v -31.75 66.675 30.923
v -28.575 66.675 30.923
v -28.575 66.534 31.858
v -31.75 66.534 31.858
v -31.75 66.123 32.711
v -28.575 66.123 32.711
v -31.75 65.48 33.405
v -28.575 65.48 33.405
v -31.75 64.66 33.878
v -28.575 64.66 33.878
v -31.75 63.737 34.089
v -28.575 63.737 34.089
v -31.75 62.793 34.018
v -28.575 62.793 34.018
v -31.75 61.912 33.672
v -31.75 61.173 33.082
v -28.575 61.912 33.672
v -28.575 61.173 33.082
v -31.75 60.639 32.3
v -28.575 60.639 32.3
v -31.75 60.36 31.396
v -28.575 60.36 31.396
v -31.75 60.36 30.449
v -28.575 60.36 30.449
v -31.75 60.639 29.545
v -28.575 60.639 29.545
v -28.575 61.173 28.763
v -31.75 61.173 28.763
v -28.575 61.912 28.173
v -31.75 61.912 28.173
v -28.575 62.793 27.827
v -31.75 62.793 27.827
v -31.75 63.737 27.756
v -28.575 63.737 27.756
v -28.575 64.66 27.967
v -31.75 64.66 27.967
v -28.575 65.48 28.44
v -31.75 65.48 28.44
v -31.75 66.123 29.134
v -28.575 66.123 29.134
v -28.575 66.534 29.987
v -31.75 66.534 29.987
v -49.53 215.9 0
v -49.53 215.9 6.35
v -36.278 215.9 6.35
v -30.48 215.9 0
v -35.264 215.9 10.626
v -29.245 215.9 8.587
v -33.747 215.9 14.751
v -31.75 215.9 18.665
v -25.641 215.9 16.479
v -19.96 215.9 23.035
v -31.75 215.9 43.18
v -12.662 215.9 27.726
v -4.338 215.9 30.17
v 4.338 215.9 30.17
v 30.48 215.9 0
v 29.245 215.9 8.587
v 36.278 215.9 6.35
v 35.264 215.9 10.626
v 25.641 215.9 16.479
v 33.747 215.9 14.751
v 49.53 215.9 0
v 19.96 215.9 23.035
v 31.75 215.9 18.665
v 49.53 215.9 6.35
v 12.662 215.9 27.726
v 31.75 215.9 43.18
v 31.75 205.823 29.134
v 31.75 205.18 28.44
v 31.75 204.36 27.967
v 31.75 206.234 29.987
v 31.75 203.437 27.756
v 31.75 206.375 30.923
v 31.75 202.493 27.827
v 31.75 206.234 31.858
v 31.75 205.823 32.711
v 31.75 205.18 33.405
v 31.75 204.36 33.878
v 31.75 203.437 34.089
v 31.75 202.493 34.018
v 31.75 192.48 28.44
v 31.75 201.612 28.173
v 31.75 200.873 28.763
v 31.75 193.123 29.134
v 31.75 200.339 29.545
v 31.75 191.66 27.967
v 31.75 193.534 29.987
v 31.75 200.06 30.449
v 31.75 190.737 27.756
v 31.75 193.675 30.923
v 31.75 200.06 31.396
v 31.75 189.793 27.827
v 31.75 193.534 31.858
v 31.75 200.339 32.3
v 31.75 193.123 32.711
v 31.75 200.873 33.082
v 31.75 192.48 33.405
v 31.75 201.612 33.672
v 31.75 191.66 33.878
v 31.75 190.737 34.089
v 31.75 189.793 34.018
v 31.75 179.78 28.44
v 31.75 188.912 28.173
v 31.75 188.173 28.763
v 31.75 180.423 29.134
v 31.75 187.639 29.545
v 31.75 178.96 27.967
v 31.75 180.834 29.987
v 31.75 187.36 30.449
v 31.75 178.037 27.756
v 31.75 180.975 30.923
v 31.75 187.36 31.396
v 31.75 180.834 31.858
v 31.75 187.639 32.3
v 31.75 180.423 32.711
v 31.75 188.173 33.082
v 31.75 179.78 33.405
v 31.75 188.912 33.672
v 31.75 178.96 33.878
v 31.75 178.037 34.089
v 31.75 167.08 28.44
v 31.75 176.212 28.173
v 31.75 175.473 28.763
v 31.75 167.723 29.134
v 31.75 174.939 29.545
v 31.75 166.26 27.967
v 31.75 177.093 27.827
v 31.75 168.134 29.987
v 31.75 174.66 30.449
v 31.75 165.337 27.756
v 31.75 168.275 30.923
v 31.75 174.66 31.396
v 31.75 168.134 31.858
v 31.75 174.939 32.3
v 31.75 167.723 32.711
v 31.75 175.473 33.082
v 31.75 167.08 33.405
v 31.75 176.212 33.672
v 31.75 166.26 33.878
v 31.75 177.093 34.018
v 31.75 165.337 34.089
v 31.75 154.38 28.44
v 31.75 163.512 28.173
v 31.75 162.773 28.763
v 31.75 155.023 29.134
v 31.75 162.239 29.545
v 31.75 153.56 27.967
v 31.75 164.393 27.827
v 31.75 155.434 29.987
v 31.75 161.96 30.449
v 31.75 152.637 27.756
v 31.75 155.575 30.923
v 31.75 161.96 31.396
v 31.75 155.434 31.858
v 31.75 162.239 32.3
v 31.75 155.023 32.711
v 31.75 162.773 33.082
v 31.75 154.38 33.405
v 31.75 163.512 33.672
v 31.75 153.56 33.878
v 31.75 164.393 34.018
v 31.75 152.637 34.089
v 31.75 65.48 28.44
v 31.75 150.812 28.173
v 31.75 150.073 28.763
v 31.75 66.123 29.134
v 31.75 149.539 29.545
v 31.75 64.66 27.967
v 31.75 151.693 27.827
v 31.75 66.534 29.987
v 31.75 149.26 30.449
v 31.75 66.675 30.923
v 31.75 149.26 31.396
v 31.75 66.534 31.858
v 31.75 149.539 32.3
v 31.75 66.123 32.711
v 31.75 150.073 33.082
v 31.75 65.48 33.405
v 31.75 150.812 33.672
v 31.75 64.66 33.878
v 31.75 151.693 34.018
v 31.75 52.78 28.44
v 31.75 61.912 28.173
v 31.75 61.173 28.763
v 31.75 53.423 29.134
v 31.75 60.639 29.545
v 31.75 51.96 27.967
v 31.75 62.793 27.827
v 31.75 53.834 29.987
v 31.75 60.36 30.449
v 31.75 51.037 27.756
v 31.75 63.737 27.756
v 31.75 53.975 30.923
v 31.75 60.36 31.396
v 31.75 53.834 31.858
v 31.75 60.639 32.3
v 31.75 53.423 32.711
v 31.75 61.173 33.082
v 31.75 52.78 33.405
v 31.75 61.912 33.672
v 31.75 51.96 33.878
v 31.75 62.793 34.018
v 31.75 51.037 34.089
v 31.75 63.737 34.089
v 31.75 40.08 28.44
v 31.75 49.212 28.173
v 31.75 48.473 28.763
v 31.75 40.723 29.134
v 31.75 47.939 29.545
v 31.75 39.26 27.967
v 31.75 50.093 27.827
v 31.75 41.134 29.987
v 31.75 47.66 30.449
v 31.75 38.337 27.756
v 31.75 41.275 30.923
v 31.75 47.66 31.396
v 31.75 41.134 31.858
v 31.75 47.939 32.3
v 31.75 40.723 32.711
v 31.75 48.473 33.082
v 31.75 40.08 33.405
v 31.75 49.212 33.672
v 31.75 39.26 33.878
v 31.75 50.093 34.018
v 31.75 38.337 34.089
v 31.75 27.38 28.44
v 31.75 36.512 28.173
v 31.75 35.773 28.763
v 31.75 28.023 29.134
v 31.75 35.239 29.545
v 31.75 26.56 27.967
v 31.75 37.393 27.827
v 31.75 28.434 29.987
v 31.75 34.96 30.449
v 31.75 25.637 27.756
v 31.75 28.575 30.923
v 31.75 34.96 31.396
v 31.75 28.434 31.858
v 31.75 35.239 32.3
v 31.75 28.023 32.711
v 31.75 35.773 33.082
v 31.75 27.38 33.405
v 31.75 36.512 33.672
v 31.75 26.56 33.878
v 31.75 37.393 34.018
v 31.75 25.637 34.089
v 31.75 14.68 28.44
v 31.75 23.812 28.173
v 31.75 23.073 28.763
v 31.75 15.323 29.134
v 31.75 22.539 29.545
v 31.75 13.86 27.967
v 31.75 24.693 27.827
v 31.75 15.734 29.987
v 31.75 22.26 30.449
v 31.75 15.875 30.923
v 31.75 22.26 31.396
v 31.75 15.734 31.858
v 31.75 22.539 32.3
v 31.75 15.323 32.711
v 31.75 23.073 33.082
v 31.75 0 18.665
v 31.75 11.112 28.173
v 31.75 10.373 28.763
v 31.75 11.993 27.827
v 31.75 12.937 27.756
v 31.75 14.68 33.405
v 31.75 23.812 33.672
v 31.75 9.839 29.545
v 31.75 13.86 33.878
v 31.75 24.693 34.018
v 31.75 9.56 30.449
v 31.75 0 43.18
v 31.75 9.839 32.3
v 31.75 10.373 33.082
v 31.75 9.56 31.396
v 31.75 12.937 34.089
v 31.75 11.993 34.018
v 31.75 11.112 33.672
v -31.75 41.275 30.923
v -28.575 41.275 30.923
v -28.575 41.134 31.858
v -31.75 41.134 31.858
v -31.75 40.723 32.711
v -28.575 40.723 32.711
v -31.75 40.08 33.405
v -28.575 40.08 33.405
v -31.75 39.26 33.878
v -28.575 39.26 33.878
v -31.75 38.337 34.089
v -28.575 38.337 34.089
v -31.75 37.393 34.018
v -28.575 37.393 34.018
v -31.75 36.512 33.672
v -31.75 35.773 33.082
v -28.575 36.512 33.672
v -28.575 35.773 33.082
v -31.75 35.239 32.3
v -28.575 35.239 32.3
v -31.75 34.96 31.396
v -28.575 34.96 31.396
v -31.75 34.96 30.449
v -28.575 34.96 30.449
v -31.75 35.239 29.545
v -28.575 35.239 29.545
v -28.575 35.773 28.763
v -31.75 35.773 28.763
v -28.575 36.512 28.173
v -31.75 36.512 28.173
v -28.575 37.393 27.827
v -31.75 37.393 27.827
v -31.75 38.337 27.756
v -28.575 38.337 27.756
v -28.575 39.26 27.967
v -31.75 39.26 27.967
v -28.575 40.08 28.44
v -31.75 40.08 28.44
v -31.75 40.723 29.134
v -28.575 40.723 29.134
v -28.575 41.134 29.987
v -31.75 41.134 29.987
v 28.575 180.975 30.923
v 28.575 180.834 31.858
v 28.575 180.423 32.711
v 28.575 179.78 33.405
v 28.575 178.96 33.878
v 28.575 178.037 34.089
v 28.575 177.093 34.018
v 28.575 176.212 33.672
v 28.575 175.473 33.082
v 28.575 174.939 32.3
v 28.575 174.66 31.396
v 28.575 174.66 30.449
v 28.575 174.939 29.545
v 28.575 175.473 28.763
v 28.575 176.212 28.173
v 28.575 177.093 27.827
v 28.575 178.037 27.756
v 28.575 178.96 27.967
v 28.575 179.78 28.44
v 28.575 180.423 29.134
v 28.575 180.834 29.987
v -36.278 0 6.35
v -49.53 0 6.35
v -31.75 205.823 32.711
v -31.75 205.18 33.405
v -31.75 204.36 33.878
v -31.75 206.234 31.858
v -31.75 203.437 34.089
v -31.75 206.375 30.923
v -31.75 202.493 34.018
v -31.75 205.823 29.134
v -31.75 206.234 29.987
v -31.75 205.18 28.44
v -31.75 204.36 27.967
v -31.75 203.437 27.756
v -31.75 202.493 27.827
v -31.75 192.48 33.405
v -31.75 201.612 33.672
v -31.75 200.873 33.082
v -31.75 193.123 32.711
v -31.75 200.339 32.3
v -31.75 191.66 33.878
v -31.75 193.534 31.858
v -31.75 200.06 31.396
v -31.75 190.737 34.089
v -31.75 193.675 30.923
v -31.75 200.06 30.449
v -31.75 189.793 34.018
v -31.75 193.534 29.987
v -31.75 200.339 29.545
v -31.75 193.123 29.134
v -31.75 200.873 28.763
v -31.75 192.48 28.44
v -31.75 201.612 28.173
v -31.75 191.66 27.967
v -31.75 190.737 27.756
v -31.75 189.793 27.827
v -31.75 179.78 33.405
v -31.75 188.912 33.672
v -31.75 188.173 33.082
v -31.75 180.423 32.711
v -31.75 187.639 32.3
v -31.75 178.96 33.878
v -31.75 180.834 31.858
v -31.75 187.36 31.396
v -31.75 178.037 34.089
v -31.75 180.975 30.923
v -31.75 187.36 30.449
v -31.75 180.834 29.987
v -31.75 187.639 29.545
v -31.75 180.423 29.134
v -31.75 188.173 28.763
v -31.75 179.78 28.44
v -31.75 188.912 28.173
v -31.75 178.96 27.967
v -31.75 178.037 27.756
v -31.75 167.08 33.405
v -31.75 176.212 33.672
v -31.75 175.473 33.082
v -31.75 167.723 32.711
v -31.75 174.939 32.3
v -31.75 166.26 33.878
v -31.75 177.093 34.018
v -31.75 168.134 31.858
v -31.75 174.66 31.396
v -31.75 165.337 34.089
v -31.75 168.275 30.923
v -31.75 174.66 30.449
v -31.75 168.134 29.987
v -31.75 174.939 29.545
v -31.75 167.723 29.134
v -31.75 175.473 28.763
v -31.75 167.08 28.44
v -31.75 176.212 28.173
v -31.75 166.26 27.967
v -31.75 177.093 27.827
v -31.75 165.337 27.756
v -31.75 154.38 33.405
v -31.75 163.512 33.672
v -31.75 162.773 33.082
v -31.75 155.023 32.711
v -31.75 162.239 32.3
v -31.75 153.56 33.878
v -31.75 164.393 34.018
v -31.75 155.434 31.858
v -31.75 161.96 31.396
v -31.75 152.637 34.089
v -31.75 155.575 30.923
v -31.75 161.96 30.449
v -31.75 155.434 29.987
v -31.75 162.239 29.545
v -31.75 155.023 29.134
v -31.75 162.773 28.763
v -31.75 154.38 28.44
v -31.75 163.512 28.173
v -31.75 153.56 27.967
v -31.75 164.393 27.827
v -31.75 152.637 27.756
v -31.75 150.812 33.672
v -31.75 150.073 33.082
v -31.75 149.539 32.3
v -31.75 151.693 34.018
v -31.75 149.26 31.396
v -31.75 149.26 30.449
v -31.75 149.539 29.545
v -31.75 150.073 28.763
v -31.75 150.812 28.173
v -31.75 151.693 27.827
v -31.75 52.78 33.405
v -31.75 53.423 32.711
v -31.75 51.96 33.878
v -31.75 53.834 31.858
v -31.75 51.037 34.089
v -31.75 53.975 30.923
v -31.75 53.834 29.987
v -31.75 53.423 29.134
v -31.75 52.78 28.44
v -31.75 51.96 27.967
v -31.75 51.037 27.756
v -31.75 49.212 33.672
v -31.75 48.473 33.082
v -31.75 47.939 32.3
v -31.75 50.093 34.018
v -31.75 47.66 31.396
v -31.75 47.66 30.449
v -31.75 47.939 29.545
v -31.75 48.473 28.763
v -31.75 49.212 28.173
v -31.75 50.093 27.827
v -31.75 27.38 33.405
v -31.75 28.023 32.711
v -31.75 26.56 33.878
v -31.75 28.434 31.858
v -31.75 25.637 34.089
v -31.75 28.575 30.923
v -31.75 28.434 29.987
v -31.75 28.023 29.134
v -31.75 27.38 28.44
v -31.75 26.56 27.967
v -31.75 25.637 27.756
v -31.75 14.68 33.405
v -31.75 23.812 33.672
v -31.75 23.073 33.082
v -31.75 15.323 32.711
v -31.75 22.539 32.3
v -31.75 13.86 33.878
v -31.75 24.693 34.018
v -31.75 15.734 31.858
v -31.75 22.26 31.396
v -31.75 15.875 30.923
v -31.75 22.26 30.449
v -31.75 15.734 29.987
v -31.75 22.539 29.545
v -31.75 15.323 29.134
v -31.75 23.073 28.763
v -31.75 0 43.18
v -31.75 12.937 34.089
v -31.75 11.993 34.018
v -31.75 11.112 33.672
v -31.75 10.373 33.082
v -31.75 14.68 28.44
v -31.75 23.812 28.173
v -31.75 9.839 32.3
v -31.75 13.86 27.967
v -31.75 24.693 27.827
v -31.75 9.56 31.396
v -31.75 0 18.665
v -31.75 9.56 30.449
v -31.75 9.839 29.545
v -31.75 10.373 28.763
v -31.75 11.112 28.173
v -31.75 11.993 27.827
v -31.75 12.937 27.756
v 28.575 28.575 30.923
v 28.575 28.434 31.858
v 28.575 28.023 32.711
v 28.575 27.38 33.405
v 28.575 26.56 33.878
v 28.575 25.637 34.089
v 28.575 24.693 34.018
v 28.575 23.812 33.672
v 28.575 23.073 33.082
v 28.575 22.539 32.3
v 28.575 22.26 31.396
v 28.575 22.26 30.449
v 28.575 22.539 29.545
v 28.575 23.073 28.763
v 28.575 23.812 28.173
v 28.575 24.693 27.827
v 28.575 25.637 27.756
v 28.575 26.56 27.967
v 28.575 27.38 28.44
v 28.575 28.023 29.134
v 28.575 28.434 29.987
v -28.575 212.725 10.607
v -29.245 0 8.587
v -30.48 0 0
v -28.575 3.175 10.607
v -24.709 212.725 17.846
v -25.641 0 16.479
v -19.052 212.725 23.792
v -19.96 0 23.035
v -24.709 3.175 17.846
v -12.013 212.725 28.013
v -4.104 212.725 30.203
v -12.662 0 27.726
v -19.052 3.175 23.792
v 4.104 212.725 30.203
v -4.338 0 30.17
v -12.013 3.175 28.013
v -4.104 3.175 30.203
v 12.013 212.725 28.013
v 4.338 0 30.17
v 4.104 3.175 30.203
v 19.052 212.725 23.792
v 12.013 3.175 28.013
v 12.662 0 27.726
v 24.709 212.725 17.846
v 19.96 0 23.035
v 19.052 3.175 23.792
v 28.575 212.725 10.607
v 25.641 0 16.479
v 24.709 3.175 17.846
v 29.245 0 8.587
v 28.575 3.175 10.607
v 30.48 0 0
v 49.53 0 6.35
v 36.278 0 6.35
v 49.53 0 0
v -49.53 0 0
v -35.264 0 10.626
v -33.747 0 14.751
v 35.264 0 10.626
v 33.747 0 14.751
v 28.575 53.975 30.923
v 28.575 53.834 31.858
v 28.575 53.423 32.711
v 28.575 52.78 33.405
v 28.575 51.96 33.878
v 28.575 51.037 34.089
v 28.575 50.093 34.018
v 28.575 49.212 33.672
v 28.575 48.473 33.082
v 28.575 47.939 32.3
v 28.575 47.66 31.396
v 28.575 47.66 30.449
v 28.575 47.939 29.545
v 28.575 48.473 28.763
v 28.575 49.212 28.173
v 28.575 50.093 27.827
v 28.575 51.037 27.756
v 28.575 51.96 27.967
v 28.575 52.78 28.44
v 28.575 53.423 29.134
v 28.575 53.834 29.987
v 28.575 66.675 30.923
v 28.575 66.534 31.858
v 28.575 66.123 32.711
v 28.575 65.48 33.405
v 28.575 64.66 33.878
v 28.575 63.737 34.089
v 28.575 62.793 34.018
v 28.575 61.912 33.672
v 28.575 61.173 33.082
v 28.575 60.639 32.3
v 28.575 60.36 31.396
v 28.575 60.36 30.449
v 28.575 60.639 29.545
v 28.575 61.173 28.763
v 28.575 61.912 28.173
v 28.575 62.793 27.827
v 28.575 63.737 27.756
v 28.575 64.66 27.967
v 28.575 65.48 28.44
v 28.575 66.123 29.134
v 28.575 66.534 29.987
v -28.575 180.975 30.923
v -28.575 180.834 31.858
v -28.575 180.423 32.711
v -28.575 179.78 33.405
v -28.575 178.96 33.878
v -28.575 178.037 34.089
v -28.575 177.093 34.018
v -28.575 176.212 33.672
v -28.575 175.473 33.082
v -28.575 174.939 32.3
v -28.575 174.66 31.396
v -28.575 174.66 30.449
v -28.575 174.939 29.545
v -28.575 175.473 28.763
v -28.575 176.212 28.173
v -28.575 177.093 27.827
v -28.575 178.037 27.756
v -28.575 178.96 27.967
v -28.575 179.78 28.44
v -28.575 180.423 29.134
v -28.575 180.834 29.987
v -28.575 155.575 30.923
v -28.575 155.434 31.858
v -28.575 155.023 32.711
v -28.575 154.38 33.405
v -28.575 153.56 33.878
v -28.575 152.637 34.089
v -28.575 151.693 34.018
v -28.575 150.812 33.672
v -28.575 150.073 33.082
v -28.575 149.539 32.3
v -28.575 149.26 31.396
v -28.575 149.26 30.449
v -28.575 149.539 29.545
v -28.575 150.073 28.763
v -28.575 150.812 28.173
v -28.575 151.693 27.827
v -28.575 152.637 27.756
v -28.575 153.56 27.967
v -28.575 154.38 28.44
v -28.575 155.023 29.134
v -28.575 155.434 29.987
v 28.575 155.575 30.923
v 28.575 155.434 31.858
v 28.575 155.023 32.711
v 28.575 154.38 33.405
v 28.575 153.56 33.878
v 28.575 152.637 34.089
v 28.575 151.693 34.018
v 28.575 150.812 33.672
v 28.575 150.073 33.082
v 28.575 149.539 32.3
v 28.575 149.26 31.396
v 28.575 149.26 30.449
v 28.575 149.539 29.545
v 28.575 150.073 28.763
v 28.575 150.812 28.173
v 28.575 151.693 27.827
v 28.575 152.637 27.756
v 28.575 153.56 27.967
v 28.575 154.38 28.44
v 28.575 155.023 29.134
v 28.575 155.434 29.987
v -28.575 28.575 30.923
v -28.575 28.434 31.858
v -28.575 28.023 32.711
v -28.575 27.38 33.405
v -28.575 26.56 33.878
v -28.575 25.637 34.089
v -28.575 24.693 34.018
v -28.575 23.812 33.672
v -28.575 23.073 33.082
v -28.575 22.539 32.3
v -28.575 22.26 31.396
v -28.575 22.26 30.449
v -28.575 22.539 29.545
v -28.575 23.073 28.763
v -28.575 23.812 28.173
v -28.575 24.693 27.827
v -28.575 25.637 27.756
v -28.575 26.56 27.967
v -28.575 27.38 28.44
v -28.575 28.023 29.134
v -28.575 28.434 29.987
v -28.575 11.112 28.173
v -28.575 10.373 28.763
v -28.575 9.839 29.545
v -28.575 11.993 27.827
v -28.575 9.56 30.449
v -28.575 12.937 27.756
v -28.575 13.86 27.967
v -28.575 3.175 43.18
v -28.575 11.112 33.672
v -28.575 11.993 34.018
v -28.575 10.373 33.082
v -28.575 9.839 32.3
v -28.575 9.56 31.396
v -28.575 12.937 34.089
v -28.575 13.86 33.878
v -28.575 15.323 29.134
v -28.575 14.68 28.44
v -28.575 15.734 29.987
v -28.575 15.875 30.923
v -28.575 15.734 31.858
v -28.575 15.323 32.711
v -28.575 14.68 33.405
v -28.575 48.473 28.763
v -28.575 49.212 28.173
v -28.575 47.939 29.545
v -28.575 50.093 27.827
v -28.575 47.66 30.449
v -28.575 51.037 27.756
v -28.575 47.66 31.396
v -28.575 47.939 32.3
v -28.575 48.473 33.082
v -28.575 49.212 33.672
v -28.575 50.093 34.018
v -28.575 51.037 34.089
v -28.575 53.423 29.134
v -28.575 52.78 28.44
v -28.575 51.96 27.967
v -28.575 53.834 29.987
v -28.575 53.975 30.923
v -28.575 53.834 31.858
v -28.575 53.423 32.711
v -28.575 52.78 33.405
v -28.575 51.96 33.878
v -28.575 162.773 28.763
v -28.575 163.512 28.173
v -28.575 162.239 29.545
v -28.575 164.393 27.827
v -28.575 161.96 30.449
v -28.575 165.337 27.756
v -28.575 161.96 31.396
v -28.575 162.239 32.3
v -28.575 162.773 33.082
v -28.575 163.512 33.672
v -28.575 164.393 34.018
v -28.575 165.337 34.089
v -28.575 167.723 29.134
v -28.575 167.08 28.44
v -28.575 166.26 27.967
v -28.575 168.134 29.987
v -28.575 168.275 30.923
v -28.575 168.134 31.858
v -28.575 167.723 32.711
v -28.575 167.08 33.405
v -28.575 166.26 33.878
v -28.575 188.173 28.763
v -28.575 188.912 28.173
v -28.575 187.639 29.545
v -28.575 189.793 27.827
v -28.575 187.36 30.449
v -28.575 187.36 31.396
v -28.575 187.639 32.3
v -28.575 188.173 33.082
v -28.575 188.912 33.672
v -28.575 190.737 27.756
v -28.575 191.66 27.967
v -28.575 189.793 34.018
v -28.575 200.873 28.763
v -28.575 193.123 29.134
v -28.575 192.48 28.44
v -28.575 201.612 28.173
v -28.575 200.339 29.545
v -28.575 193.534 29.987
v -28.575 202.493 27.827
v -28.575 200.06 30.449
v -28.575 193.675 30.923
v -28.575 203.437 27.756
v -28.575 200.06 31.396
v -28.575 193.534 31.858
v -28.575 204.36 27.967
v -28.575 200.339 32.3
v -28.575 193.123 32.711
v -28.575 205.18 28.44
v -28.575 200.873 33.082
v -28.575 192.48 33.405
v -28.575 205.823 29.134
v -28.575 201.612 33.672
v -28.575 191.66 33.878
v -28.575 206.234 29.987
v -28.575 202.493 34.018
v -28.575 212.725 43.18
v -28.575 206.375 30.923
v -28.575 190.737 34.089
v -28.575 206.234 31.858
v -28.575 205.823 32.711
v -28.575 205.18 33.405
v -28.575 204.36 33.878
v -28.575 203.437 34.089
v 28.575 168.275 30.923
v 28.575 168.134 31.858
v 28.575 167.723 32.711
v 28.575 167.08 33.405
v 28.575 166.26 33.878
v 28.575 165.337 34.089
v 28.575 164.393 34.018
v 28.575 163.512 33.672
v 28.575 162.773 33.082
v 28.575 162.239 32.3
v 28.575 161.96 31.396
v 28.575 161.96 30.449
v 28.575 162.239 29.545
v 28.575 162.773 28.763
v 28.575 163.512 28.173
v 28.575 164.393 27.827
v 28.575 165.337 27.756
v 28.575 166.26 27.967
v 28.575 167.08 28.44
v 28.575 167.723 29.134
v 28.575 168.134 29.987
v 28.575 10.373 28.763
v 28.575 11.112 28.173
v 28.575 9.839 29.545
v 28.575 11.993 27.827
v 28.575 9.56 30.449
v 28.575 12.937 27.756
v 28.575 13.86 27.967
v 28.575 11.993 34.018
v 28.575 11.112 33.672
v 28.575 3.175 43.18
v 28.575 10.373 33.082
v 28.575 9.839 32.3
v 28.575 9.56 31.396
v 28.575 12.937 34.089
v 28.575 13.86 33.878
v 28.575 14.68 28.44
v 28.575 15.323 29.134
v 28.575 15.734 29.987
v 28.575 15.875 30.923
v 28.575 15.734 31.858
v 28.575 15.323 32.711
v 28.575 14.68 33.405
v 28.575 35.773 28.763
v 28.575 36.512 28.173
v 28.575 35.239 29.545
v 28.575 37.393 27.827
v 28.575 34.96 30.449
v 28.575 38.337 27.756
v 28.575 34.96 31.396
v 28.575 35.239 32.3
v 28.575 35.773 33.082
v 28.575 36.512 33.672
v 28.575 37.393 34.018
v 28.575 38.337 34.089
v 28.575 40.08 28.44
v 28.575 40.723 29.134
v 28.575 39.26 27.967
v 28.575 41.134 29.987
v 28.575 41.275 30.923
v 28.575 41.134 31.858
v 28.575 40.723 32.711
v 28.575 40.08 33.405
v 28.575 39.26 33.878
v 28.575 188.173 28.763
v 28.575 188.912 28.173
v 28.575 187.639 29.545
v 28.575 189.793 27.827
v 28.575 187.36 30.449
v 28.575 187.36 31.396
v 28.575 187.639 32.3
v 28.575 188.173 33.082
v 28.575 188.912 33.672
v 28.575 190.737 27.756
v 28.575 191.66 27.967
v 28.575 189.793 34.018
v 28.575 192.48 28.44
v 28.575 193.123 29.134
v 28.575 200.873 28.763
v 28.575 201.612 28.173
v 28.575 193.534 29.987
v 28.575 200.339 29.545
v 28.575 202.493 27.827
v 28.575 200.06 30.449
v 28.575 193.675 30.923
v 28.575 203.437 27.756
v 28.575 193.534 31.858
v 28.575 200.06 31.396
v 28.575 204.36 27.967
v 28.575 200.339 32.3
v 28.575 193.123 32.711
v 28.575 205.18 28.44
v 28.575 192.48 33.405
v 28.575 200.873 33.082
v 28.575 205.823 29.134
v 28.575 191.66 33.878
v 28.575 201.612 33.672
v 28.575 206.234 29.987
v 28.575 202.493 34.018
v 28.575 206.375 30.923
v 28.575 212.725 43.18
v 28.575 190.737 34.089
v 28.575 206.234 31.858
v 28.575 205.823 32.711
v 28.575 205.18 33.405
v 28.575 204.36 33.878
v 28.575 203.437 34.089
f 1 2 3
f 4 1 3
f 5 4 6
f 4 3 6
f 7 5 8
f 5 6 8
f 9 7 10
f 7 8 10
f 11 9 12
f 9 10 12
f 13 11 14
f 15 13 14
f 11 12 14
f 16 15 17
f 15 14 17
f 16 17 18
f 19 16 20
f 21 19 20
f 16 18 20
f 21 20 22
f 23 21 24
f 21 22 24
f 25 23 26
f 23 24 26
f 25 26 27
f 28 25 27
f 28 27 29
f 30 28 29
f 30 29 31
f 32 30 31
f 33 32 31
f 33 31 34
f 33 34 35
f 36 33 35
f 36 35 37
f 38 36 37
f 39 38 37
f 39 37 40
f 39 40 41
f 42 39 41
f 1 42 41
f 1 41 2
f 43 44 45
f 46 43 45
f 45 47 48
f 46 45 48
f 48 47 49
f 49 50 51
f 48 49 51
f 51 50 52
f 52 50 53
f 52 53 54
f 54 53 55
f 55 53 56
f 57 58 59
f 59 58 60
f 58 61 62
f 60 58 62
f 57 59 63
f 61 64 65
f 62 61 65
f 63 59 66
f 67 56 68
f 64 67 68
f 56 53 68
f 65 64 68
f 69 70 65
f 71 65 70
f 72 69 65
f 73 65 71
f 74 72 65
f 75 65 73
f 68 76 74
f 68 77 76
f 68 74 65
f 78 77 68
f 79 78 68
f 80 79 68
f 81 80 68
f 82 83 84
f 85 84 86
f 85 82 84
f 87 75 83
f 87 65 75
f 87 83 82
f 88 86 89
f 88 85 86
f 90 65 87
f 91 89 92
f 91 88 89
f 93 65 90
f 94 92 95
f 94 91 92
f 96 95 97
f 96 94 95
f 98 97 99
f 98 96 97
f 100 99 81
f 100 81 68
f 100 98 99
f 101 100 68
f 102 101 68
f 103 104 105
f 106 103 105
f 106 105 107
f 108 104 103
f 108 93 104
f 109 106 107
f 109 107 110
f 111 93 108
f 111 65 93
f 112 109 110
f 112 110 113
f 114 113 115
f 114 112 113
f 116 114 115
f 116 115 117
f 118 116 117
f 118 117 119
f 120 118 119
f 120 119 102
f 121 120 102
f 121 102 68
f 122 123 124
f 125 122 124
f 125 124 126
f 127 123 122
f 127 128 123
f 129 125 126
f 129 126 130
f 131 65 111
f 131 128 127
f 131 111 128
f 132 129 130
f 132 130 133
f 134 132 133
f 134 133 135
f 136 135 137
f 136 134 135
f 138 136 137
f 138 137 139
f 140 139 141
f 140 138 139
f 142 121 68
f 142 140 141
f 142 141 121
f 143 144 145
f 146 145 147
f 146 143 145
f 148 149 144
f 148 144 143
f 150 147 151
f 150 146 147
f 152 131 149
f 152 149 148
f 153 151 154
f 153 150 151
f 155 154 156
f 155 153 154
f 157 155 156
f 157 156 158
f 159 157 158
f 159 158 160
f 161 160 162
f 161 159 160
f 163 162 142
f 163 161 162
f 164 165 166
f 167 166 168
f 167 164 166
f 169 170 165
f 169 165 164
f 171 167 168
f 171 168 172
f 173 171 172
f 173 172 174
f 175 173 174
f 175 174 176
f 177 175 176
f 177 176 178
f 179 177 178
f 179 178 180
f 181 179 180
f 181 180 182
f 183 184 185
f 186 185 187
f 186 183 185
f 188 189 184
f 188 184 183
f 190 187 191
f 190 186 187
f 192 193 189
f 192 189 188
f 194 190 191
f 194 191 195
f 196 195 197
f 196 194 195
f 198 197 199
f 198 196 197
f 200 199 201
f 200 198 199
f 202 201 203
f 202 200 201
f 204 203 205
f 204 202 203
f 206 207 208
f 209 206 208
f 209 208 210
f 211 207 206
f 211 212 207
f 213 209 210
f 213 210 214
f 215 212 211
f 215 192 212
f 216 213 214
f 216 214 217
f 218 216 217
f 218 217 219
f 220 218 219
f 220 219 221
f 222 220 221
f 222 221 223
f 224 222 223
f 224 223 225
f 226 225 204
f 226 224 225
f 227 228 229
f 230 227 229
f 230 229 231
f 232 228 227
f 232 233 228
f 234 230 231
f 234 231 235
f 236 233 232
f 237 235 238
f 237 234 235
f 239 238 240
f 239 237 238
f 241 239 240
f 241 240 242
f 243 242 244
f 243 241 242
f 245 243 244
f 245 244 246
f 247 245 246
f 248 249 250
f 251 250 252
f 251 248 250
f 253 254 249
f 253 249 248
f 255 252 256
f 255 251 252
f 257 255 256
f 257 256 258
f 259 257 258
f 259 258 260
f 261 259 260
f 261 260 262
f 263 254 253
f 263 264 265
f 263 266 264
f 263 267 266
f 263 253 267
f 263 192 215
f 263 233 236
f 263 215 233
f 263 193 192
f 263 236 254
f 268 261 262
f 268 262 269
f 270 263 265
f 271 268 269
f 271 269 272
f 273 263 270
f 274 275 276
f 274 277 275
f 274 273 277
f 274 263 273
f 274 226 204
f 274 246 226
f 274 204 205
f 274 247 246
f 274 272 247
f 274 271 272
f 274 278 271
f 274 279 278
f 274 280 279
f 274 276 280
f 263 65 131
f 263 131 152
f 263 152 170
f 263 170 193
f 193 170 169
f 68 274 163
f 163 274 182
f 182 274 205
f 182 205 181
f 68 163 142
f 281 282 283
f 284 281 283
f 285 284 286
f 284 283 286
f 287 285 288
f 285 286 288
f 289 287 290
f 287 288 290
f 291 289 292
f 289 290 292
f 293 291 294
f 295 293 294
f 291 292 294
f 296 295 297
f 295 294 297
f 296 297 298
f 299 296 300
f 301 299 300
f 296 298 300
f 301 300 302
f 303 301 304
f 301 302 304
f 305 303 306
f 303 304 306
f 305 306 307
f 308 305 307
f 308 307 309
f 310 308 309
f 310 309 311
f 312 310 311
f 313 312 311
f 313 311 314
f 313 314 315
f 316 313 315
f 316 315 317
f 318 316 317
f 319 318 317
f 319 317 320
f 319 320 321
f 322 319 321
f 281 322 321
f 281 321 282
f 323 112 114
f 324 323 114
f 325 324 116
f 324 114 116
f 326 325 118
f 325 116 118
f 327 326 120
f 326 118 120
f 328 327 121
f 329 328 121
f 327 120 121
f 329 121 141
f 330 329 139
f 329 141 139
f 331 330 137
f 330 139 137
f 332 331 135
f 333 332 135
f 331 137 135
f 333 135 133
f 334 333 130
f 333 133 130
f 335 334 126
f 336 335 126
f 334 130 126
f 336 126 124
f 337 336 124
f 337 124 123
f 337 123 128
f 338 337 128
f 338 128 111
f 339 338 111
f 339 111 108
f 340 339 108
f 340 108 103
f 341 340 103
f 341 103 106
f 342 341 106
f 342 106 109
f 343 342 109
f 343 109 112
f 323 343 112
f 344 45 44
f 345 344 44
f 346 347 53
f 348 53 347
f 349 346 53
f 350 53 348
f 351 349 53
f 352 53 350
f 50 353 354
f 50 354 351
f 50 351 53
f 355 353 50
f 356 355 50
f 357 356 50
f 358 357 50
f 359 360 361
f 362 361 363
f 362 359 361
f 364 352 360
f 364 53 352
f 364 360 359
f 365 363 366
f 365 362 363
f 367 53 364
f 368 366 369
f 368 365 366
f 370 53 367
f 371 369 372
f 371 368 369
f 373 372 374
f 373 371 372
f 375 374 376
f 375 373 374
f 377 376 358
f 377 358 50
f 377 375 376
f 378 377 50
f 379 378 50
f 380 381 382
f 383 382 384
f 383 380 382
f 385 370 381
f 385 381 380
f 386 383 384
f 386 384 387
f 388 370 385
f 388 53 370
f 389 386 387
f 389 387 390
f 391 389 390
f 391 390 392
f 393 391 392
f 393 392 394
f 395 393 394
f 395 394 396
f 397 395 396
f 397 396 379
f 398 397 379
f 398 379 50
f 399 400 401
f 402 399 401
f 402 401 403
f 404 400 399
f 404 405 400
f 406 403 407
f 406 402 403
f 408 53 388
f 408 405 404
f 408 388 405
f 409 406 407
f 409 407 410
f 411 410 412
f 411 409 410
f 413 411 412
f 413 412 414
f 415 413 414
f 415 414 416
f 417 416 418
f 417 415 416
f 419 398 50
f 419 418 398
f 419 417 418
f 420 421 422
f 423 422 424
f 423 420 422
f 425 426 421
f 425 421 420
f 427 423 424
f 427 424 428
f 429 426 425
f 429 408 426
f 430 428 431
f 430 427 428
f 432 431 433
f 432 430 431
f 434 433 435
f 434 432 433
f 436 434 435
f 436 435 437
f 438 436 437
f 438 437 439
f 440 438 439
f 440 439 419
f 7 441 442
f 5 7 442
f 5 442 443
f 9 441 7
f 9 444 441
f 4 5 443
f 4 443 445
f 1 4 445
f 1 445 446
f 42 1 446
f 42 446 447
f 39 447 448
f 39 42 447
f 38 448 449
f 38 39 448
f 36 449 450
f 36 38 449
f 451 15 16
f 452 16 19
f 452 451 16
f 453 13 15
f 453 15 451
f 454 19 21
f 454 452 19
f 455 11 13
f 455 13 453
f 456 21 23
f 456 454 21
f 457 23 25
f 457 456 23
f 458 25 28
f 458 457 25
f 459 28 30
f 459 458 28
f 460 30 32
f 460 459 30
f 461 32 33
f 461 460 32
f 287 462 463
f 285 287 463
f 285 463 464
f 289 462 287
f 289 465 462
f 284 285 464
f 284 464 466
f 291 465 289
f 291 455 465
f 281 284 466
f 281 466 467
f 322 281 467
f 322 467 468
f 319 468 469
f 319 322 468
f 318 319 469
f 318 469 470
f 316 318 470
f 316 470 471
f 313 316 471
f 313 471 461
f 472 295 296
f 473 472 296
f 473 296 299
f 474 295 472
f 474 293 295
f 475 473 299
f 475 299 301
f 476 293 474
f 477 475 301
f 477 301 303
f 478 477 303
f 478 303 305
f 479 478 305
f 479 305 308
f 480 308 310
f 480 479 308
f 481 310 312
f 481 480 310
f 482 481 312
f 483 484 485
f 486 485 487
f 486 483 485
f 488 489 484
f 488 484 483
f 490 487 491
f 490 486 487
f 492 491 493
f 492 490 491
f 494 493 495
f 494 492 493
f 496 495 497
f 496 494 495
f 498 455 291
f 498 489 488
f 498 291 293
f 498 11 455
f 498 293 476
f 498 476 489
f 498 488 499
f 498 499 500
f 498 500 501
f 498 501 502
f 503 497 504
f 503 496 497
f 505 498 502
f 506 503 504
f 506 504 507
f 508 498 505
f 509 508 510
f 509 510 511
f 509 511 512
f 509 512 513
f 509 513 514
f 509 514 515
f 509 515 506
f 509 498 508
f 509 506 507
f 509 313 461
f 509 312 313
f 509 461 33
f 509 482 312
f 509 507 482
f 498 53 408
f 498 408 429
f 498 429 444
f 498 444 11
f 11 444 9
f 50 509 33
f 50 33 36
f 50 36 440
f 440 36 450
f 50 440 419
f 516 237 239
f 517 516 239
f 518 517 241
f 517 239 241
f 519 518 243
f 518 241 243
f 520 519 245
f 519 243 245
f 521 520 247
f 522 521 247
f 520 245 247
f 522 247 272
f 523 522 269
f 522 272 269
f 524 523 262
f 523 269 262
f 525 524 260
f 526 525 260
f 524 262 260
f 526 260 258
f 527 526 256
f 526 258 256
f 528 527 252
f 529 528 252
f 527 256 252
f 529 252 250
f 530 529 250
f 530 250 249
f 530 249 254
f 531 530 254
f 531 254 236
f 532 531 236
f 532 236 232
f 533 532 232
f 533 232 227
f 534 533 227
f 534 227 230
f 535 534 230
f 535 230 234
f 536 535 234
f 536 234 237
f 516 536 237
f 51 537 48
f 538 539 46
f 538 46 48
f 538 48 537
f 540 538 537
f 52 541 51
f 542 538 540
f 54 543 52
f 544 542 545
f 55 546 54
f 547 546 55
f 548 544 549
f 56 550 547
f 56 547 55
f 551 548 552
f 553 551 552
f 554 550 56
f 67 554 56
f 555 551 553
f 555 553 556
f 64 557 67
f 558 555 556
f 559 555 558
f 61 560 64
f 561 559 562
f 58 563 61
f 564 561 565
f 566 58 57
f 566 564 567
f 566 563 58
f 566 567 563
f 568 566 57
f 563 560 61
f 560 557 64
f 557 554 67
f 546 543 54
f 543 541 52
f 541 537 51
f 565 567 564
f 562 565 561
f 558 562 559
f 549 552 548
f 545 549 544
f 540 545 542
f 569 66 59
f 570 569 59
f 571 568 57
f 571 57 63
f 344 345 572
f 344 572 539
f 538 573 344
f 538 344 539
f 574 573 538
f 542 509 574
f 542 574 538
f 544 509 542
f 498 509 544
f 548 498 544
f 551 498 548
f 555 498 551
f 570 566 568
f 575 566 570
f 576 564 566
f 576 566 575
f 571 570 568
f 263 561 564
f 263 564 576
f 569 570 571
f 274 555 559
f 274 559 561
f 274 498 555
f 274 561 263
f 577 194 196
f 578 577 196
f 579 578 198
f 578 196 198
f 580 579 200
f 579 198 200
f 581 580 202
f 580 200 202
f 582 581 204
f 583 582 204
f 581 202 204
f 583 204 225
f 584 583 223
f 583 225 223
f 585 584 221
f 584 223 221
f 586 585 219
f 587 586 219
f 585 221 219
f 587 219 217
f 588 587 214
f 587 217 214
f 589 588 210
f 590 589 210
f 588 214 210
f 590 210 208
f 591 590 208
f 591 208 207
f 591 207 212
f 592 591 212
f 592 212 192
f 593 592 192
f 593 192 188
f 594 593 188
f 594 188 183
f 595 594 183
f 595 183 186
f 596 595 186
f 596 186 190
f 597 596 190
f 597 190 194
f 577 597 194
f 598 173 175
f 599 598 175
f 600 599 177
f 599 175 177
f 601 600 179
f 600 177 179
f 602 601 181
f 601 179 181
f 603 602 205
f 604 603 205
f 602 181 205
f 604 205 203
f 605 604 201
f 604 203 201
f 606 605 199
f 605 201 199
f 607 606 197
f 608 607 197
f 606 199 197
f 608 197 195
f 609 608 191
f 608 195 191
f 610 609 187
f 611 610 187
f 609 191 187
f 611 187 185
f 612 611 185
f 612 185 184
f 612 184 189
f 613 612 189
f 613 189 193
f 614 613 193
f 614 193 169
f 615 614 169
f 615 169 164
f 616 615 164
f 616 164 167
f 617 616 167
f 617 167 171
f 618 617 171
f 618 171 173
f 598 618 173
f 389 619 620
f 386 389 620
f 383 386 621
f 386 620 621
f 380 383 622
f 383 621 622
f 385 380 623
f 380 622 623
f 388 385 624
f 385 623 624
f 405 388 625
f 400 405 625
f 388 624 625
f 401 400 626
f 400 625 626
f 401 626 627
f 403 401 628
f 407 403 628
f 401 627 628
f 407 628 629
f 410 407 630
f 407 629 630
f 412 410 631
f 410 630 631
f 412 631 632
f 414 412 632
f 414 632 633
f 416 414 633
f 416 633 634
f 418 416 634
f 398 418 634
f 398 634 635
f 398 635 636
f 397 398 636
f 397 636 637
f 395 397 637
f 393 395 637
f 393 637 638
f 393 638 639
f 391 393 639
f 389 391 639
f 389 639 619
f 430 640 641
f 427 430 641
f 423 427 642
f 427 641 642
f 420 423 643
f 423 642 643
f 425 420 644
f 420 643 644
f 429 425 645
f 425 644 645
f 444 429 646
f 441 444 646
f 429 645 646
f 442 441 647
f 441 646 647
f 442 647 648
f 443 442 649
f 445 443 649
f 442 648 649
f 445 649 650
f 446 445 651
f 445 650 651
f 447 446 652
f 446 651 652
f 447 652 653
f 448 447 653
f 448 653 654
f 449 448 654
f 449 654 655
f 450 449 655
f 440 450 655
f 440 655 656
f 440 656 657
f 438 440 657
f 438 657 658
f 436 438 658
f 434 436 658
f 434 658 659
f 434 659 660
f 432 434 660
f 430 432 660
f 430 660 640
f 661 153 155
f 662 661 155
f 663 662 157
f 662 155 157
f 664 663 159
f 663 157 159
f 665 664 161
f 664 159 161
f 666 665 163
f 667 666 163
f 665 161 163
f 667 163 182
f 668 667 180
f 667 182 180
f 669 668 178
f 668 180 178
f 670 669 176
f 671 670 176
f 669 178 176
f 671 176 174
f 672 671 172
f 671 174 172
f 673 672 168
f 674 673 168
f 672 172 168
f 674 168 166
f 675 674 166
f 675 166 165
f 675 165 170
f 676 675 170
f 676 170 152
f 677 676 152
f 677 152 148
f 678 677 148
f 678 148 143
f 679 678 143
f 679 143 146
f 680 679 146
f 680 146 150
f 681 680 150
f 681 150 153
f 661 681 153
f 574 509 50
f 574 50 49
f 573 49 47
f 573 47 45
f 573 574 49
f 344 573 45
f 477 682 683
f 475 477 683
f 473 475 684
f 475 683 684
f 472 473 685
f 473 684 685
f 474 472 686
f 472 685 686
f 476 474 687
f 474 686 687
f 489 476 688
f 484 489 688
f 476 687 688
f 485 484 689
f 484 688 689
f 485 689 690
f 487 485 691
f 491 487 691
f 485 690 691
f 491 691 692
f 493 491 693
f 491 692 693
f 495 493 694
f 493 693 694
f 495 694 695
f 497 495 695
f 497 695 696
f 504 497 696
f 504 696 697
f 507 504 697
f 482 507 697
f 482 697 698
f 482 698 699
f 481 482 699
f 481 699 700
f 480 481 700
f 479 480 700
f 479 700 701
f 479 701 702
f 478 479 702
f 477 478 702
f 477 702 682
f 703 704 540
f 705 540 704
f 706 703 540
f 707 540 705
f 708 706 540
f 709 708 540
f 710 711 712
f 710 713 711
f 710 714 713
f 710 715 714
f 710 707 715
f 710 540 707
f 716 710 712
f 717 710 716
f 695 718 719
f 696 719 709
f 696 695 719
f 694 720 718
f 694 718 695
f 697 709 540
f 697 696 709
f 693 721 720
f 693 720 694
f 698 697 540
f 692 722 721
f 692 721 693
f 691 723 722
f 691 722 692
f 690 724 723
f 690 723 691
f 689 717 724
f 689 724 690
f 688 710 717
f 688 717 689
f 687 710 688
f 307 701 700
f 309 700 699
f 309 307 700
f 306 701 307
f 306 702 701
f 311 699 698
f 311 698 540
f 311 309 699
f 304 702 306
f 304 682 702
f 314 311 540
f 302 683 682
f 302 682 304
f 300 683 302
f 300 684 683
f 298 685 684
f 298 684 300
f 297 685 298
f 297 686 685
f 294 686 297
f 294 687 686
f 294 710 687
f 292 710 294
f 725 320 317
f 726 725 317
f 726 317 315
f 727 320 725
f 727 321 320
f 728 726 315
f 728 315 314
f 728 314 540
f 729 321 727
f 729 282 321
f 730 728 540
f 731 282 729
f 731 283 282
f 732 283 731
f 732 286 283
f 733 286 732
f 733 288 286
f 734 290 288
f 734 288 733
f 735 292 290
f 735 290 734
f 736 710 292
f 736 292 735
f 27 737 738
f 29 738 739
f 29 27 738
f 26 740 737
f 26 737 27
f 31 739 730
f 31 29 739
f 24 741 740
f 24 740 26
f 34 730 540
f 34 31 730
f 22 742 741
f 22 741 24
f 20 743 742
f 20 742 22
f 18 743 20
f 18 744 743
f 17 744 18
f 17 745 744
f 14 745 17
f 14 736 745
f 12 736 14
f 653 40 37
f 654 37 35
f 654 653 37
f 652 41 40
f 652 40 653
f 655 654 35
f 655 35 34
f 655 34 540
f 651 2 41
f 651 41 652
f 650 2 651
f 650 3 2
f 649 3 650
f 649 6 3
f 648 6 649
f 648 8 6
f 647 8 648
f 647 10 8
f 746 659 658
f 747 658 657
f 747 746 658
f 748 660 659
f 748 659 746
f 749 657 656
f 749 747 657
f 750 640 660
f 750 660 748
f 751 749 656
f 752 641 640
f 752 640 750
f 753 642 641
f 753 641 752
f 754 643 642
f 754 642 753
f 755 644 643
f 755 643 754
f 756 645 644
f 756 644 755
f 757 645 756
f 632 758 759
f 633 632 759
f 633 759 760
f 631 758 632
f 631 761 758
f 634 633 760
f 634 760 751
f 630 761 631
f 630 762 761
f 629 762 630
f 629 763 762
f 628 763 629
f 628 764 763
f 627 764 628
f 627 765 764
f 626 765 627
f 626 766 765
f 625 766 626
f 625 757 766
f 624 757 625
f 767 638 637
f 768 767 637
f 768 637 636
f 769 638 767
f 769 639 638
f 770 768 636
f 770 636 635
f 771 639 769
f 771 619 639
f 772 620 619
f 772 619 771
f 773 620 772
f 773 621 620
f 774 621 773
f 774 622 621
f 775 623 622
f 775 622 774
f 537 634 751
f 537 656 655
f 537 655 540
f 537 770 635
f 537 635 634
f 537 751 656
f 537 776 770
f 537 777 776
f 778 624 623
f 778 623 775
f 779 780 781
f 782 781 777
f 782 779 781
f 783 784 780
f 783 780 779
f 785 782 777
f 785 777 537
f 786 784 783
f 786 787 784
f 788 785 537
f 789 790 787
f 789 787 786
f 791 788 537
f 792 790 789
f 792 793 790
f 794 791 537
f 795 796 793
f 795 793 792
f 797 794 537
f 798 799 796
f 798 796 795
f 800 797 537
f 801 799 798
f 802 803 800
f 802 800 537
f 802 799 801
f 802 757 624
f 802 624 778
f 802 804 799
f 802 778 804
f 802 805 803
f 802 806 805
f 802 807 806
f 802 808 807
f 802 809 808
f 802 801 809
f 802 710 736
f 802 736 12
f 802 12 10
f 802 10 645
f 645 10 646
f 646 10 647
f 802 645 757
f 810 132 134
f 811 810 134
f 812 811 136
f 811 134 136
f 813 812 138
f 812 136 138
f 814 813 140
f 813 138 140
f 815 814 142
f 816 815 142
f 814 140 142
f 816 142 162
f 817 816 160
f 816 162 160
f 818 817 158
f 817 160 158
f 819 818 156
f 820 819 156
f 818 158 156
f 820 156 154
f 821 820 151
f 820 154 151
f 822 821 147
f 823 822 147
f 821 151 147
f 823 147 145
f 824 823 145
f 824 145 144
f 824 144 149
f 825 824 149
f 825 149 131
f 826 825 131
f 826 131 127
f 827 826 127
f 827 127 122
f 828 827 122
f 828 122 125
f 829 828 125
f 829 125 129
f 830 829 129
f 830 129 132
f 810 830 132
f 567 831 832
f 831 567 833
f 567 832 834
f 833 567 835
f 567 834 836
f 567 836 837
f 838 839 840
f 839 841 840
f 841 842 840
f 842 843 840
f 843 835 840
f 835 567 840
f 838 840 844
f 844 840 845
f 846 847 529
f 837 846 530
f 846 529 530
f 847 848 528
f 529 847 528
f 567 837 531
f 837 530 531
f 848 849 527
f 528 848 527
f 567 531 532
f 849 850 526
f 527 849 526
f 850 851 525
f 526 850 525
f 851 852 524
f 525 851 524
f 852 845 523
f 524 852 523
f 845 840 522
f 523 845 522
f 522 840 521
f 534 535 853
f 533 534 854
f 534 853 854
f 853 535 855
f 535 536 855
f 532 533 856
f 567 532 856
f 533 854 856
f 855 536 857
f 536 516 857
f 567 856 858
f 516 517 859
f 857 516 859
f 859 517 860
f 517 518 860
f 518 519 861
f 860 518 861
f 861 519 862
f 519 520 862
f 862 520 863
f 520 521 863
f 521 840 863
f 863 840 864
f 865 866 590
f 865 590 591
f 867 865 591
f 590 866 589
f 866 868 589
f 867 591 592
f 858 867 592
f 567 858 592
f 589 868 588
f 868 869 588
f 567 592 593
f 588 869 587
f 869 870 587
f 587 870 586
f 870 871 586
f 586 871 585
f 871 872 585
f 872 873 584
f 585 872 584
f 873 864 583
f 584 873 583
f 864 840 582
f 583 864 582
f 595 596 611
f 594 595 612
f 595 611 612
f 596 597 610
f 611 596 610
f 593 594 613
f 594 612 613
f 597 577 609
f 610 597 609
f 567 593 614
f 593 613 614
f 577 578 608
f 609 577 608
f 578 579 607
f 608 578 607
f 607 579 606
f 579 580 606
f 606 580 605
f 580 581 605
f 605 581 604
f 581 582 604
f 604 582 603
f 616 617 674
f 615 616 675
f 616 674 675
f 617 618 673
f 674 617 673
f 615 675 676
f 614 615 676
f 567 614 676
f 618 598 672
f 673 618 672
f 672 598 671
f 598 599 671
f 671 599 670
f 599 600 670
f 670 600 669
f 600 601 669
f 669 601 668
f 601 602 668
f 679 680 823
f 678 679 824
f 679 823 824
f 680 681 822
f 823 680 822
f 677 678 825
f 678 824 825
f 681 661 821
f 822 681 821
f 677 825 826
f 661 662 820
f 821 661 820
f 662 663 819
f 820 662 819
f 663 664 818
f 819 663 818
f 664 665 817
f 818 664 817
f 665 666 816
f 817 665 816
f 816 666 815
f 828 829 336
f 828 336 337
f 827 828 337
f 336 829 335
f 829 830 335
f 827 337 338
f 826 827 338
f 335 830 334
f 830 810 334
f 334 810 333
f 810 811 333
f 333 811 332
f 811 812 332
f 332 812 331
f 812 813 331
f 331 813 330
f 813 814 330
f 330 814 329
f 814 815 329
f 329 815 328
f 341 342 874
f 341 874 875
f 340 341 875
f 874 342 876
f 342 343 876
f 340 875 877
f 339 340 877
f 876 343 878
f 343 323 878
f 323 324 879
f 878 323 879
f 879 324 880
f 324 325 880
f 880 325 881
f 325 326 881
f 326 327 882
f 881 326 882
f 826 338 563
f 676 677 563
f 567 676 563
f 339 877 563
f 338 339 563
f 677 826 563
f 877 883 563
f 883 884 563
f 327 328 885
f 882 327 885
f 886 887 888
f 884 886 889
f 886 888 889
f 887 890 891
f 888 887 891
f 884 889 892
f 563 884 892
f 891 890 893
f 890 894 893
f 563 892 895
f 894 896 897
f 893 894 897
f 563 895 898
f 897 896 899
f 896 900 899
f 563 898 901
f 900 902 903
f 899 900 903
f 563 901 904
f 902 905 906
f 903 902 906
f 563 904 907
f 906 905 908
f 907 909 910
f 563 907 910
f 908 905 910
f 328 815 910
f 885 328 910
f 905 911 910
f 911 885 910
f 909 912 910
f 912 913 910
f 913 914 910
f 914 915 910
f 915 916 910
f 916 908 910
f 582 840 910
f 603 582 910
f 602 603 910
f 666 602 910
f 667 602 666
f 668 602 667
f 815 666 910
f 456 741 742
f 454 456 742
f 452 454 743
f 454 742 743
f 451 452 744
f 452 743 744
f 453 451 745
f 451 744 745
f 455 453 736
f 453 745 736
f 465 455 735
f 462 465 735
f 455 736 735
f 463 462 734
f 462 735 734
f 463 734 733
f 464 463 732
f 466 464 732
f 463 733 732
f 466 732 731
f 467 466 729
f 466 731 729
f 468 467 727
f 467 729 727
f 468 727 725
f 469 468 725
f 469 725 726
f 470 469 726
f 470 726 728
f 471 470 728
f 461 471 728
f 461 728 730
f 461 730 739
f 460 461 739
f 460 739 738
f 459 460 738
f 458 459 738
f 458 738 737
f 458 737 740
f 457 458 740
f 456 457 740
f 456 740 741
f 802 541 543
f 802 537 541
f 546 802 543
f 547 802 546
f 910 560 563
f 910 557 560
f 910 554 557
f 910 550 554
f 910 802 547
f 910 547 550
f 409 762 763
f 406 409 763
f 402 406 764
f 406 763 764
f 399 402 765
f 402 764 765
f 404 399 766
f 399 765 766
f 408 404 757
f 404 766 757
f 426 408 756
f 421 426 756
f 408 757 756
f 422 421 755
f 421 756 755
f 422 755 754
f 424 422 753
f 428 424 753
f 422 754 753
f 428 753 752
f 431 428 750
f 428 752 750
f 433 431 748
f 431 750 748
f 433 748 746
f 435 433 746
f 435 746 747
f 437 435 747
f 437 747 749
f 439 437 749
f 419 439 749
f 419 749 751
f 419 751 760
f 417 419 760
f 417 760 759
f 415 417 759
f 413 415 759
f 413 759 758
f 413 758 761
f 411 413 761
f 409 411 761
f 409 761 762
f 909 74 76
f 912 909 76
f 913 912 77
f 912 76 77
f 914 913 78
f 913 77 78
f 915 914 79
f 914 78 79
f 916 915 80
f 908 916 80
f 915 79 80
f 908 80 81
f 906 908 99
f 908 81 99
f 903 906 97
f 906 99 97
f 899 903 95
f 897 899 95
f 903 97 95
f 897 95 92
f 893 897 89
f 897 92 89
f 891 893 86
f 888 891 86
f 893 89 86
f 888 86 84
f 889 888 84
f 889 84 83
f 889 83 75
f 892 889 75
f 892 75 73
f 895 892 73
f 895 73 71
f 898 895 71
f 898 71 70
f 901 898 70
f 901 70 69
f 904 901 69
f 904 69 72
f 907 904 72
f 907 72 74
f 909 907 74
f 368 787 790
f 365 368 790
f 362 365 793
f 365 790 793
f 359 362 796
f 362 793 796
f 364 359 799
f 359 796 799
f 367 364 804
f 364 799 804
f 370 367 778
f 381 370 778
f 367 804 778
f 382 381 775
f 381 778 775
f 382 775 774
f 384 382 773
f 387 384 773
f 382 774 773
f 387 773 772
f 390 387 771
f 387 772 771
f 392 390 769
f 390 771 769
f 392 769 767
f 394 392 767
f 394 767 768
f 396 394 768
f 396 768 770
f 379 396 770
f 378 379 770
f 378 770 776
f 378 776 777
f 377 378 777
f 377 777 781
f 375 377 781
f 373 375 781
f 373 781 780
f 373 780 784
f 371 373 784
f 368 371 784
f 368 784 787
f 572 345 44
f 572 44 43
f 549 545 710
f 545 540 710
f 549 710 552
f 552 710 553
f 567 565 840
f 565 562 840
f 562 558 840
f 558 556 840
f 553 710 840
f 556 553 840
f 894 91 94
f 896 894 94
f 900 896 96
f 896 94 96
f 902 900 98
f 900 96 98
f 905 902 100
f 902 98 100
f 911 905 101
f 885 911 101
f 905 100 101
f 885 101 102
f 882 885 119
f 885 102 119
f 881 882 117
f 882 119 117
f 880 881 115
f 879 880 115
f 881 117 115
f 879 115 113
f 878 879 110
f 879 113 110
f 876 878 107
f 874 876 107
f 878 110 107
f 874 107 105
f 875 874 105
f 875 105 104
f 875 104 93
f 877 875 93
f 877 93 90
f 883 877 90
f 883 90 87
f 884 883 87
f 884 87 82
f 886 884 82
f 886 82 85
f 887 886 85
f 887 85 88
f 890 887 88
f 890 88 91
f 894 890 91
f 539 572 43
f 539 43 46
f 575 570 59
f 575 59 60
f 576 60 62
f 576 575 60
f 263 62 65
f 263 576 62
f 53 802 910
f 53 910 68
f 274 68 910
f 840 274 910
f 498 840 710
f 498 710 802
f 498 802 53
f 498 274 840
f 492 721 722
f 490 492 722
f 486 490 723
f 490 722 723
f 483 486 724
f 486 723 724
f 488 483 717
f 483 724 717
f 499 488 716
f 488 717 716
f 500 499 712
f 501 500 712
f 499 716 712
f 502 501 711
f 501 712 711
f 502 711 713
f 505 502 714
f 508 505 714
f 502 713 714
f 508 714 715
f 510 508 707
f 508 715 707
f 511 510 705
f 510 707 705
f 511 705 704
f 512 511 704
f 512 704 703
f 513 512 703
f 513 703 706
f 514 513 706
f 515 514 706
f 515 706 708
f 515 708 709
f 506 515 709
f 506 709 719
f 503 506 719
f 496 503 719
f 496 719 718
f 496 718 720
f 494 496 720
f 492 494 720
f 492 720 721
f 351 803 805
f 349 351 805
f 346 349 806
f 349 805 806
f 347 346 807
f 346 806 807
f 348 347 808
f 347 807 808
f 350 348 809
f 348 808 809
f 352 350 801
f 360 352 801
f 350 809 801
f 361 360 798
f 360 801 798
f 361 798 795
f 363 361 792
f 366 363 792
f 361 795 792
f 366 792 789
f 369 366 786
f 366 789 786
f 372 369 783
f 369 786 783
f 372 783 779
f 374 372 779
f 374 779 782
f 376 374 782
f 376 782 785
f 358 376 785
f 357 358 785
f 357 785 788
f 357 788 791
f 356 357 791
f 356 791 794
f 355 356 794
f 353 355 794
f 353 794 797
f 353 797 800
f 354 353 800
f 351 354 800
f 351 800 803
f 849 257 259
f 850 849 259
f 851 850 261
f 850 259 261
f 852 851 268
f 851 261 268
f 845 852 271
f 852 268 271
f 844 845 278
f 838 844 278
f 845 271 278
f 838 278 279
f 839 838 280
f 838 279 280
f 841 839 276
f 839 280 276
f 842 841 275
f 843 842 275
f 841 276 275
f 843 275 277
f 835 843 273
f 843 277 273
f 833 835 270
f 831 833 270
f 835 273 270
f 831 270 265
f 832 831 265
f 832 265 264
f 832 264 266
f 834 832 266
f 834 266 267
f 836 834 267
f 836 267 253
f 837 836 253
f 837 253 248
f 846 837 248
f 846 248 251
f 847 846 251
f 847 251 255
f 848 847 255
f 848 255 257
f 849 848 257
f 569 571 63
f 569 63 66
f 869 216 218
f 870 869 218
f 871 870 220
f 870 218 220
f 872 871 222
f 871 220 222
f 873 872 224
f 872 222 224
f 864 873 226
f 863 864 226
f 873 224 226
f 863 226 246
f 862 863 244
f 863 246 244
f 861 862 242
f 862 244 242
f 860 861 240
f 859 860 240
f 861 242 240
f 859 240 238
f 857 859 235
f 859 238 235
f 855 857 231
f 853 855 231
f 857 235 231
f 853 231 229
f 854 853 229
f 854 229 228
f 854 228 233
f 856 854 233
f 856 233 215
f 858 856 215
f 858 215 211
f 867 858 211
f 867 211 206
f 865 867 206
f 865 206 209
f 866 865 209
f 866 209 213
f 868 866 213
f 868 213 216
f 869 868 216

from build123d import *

# Parameters (mm, degrees)
F1_DEPTH = 215.9
F2_W     = 57.15
F2_H     = 209.55
F3_DEPTH = 32.5744088888
F4_R     = 3.175
F5_DEPTH = 81.281


# Not quite as in the source:
# - a feature names something its author has since deleted; it is built from what else it names


with BuildPart() as f1:
    # F0 (on Front) → F1 (new body)
    with BuildSketch(Plane.XZ):
        with BuildLine():
            Line((-36.83, 0), (-30.48, 0))
            ThreePointArc((-30.48, 0), (0, 30.48), (30.48, 0))
            Line((30.48, 0), (36.83, 0))
            Line((36.83, 0), (49.53, 0))
            Line((49.53, 0), (49.53, 6.35))
            Line((49.53, 6.35), (36.278456417, 6.35))
            ThreePointArc((36.278456417, 6.35), (34.5670828322, 12.7108490854), (31.75, 18.66511184))
            ThreePointArc((31.75, 18.66511184), (30.2489666674, 21.0106857469), (28.575, 23.2361415687))
            ThreePointArc((28.575, 23.2361415687), (0, 36.83), (-28.575, 23.2361415687))
            ThreePointArc((-28.575, 23.2361415687), (-30.2489666674, 21.0106857469), (-31.75, 18.66511184))
            ThreePointArc((-31.75, 18.66511184), (-34.5670828322, 12.7108490854), (-36.278456417, 6.35))
            Line((-36.278456417, 6.35), (-49.53, 6.35))
            Line((-49.53, 6.35), (-49.53, 0))
            Line((-49.53, 0), (-36.83, 0))
        make_face()
        with BuildLine():
            ThreePointArc((28.575, 23.2361415687), (30.2489666674, 21.0106857469), (31.75, 18.66511184))
            Line((31.75, 18.66511184), (31.75, 43.18))
            Line((31.75, 43.18), (28.575, 43.18))
            Line((28.575, 43.18), (28.575, 23.2361415687))
        make_face()
        with BuildLine():
            Line((-28.575, 43.18), (-28.575, 23.2361415687))
            ThreePointArc((-28.575, 23.2361415687), (0, 36.83), (28.575, 23.2361415687))
            Line((28.575, 23.2361415687), (28.575, 43.18))
            Line((28.575, 43.18), (-28.575, 43.18))
        make_face()
        with BuildLine():
            Line((-31.75, 43.18), (-31.75, 18.66511184))
            ThreePointArc((-31.75, 18.66511184), (-30.2489666674, 21.0106857469), (-28.575, 23.2361415687))
            Line((-28.575, 23.2361415687), (-28.575, 43.18))
            Line((-28.575, 43.18), (-31.75, 43.18))
        make_face()
    extrude(amount=-F1_DEPTH)

    # F2 (on face) → F3 (cut, through all)
    with BuildSketch(Plane.XY.offset(43.18)):
        with Locations((0, 107.95)):
            Rectangle(F2_W, F2_H)
    extrude(amount=-F3_DEPTH, mode=Mode.SUBTRACT)

    # F4 (on face) → F5 (cut, through all)
    with BuildSketch(Plane.YZ.offset(31.75)):
        with Locations((12.7, 30.92255592)):
            Circle(F4_R)
        with Locations((25.4, 30.92255592)):
            Circle(F4_R)
        with Locations((38.1, 30.92255592)):
            Circle(F4_R)
        with Locations((50.8, 30.92255592)):
            Circle(F4_R)
        with Locations((63.5, 30.92255592)):
            Circle(F4_R)
        with Locations((152.4, 30.92255592)):
            Circle(F4_R)
        with Locations((165.1, 30.92255592)):
            Circle(F4_R)
        with Locations((177.8, 30.92255592)):
            Circle(F4_R)
        with Locations((190.5, 30.92255592)):
            Circle(F4_R)
        with Locations((203.2, 30.92255592)):
            Circle(F4_R)
    extrude(amount=-F5_DEPTH, mode=Mode.SUBTRACT)


solid = f1.part
